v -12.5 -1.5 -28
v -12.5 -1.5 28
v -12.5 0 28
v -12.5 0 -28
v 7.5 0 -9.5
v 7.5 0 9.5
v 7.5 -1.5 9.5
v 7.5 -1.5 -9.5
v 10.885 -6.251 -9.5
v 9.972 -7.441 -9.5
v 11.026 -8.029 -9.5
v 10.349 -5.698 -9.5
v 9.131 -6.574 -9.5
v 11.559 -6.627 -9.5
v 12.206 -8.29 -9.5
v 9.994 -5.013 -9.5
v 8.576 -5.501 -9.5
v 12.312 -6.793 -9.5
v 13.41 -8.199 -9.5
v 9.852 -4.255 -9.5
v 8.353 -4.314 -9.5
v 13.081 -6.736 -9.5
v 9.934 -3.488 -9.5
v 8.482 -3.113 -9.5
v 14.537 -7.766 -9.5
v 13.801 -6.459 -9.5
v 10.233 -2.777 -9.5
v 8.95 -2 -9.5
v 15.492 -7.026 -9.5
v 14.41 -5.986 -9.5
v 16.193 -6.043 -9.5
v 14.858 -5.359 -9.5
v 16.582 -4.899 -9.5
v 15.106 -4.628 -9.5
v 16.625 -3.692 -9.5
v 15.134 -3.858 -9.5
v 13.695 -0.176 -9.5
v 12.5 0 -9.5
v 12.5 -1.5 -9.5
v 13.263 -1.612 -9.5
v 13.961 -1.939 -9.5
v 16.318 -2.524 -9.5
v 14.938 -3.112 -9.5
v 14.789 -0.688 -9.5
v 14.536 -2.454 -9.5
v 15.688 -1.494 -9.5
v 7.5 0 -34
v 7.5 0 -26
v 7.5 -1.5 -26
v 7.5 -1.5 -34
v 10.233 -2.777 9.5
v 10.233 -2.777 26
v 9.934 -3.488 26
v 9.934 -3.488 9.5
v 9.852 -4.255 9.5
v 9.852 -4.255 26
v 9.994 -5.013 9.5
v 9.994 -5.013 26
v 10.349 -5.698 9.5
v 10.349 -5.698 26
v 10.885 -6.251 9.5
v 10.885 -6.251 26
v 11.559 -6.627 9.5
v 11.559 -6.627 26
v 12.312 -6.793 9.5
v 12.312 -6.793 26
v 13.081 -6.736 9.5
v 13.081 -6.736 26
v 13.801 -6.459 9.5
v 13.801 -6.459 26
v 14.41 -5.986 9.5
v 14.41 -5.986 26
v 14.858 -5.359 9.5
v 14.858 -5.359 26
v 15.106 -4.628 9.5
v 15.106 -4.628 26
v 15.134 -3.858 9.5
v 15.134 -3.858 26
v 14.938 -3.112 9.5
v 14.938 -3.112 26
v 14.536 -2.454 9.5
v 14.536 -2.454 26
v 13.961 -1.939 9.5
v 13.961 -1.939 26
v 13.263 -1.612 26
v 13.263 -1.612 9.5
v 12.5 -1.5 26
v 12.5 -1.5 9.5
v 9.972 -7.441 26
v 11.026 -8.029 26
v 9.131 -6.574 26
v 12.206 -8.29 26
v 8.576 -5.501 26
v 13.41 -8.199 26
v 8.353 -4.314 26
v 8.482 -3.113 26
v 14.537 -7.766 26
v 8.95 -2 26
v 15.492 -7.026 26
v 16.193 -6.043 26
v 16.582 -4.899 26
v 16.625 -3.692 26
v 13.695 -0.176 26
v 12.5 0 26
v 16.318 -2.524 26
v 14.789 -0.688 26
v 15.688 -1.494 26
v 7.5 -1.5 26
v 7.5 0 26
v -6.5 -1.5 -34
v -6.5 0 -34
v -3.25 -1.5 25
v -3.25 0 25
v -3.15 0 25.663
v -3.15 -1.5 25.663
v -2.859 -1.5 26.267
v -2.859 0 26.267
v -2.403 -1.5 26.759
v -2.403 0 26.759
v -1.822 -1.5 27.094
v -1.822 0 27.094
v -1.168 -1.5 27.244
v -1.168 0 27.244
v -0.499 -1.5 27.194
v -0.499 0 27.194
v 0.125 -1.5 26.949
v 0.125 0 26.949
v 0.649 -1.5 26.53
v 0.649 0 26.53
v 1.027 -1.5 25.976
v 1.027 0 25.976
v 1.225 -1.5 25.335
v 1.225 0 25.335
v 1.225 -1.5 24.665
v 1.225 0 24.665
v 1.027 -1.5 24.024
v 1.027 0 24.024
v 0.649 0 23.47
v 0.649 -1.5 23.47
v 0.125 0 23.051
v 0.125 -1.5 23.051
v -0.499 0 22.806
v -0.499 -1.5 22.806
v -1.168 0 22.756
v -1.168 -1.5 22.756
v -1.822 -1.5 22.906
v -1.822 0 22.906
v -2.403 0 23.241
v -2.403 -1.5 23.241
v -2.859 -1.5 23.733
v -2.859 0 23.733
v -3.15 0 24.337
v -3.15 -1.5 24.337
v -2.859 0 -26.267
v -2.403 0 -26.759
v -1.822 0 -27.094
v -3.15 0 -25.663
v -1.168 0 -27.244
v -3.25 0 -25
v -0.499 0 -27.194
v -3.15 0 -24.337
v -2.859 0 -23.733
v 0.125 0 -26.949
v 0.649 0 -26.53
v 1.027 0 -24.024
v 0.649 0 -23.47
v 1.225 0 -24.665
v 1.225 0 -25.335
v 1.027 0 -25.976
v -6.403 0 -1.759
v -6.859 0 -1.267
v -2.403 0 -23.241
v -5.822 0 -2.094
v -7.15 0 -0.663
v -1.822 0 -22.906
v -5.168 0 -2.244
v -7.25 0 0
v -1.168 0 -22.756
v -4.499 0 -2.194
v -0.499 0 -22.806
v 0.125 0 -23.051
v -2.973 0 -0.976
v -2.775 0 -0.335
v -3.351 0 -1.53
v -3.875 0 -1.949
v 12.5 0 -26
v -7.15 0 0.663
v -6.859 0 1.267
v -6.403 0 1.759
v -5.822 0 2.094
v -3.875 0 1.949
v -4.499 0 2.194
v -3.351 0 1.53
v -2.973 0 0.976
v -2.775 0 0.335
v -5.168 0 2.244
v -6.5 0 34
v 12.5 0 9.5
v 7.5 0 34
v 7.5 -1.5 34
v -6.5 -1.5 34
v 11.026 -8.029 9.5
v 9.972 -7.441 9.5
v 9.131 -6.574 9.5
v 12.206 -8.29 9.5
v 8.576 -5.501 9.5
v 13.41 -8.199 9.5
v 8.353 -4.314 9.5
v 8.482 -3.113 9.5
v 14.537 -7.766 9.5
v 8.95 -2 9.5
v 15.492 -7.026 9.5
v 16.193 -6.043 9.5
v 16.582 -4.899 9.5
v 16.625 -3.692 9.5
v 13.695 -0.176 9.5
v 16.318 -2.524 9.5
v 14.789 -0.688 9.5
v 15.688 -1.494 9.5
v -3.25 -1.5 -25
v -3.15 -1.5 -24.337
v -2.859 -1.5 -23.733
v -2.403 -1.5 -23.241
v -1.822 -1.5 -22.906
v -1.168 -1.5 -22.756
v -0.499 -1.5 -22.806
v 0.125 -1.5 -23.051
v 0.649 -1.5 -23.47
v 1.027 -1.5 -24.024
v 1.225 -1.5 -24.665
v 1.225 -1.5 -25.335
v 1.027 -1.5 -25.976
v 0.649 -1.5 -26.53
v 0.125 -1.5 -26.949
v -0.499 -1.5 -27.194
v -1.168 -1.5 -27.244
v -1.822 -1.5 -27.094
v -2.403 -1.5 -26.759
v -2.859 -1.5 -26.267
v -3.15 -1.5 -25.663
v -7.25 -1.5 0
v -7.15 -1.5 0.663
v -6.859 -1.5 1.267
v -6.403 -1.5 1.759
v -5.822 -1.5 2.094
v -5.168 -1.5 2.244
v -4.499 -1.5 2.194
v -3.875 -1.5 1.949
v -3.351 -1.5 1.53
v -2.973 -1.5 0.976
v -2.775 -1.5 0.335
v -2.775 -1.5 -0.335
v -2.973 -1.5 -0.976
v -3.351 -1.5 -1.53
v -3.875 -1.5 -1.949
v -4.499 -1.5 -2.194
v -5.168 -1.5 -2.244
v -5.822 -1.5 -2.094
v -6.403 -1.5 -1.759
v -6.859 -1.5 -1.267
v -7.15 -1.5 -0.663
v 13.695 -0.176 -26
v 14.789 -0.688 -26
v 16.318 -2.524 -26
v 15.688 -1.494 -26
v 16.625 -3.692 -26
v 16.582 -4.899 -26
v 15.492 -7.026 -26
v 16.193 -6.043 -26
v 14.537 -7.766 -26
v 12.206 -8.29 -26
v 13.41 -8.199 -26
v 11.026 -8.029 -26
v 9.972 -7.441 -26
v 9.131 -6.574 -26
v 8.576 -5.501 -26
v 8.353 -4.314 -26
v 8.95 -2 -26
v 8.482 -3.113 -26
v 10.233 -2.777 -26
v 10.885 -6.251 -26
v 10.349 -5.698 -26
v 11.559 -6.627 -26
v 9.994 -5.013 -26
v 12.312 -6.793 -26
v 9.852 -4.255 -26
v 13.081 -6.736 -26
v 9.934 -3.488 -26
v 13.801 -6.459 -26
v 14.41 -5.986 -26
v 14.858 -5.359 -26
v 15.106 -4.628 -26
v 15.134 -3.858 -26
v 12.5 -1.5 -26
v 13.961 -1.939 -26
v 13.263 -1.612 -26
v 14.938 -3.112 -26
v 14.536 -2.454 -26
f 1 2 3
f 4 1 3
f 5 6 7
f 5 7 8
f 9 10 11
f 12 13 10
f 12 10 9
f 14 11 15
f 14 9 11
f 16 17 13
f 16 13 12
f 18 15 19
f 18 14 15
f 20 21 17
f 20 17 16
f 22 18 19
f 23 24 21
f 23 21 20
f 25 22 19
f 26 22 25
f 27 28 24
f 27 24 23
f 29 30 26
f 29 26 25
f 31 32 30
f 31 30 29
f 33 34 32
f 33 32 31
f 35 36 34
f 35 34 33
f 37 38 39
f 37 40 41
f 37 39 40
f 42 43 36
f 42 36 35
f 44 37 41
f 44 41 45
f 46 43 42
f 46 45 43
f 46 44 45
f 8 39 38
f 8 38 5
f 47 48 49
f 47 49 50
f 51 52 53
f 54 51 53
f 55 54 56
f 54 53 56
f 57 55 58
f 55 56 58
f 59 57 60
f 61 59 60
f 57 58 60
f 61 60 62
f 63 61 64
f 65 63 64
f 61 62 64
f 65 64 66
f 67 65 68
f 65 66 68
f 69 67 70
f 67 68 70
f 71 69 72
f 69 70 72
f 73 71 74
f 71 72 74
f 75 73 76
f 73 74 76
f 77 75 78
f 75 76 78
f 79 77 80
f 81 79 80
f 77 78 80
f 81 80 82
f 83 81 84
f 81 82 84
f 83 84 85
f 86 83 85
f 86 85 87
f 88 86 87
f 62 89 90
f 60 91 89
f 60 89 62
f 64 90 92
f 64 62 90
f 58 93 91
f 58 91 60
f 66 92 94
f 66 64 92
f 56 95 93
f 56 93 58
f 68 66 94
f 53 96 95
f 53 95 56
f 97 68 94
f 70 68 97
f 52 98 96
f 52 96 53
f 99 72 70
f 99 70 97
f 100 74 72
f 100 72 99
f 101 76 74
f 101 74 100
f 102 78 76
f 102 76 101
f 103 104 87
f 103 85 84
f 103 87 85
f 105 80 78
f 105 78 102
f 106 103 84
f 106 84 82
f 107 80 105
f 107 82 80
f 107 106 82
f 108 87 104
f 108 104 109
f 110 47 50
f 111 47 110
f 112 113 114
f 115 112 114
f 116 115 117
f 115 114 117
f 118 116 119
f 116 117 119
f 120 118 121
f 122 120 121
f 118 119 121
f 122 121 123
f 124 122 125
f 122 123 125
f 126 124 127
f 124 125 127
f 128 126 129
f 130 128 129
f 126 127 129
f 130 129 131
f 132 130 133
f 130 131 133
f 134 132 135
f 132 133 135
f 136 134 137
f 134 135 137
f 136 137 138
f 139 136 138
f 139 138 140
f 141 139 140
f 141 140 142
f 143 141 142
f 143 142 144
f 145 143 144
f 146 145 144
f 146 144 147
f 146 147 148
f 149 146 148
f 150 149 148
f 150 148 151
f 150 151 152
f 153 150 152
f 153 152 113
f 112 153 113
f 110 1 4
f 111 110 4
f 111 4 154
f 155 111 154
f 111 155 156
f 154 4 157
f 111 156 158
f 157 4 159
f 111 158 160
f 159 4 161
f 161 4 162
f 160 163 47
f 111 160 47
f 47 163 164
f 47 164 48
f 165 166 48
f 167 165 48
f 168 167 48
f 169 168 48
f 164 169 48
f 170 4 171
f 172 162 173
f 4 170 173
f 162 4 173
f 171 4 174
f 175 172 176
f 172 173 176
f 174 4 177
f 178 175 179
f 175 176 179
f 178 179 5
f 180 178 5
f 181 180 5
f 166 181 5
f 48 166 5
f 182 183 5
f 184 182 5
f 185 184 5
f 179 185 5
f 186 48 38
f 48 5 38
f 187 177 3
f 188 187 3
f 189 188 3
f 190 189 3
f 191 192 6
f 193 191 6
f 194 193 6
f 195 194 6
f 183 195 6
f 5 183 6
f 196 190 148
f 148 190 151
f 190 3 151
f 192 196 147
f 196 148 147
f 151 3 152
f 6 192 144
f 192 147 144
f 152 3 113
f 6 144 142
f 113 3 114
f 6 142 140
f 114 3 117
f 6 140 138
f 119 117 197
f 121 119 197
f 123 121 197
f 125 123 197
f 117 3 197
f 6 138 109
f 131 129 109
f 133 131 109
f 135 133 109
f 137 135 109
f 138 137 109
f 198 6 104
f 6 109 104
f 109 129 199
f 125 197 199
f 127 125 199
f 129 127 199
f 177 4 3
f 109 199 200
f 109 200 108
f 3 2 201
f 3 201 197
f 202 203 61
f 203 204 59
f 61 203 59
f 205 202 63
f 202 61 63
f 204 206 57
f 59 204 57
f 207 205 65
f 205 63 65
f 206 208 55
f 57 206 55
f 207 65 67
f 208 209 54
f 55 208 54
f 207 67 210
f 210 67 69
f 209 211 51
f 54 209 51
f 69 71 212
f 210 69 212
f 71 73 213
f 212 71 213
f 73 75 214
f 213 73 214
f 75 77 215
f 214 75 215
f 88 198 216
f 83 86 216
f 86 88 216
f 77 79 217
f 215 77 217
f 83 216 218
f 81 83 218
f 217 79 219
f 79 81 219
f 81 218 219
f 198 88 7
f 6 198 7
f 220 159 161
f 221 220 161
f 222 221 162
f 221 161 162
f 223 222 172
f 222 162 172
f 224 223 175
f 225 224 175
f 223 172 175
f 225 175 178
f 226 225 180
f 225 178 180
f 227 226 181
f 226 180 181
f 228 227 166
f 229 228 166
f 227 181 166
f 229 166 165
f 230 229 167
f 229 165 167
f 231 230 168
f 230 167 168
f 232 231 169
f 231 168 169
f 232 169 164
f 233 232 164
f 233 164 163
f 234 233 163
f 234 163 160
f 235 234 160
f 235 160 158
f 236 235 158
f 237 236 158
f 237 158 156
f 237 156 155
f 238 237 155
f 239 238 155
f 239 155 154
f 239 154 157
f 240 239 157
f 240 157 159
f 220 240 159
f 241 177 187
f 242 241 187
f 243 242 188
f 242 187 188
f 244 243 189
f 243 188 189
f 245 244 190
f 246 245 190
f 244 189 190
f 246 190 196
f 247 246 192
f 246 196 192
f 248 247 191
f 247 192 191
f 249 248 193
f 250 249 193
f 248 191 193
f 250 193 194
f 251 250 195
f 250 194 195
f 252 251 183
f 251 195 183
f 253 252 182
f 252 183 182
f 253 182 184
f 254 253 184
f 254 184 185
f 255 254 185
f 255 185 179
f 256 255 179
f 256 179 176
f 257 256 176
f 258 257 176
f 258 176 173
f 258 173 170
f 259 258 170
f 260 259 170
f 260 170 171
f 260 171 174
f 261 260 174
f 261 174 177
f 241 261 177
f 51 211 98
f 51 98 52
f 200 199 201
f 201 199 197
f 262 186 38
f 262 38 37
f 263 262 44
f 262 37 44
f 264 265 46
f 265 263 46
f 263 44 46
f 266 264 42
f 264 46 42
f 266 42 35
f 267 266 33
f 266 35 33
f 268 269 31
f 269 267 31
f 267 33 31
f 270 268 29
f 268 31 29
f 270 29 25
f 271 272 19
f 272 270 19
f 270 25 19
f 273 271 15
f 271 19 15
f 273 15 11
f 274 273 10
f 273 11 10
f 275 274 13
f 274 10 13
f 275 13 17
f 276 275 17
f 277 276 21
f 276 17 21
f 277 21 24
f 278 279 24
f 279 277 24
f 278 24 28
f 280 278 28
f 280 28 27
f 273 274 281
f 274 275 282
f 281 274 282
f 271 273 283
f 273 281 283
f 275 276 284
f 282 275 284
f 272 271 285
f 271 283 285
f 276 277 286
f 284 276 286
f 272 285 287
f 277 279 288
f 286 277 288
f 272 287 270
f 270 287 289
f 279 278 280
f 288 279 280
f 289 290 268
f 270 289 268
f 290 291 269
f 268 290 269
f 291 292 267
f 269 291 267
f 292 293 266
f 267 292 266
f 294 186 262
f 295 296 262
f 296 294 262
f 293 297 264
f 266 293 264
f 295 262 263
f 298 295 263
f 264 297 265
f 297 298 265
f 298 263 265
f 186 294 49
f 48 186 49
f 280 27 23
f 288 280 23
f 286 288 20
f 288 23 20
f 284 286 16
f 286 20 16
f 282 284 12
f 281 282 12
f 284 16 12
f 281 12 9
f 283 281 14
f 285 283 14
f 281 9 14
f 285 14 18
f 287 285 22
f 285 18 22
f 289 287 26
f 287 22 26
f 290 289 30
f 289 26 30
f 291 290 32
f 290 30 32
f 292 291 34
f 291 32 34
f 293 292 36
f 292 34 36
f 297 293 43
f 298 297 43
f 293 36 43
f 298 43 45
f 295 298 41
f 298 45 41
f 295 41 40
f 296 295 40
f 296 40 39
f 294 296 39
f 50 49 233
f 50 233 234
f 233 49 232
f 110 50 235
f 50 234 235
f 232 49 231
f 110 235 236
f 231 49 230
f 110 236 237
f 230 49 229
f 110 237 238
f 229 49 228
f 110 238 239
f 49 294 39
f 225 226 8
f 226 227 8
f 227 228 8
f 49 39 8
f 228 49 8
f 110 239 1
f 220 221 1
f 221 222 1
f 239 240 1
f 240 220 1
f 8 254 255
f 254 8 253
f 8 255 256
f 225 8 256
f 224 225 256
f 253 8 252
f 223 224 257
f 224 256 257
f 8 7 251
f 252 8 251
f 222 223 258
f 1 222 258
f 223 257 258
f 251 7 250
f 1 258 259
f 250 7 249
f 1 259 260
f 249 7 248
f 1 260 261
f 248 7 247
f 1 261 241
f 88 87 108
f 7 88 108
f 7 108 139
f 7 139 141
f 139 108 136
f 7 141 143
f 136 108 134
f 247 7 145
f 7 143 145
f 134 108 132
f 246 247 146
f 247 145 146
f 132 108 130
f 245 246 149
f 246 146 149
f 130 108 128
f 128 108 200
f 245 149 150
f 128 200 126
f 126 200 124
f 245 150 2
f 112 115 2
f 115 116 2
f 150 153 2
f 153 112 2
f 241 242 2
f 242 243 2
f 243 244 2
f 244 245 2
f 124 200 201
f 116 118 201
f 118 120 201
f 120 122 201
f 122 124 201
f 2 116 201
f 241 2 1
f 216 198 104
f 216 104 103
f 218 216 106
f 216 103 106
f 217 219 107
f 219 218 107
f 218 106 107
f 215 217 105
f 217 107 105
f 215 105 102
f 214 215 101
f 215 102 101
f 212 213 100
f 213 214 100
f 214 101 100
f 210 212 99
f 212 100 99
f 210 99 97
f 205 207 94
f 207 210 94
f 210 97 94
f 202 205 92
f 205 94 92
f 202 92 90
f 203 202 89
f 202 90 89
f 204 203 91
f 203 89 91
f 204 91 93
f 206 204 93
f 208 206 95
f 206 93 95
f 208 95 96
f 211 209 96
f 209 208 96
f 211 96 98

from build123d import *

# Parameters (mm, degrees)
TABAN_FLAN_1_DEPTH    = 34
IZIM9_W               = 9.15
IZIM9_H               = 8
IZIM9_H_2             = 19
KES_EKSTR_ZYON1_DEPTH = 39.757096124
IZIM11_R              = 2.25
KES_EKSTR_ZYON2_DEPTH = 10
RADYUS1_SIZE          = 6


# Sheet-metal steps are written as plain solids
with BuildPart() as part:
    # Çizim1 → Taban-Flanş1 (new, symmetric)
    with BuildSketch(Plane.XY):
        with BuildLine():
            Line((-12.5, 0), (12.5, 0))
            ThreePointArc((12.5, 0), (14.537154879, -7.765591238), (8.95035213, -2))
            Line((8.95035213, -2), (10.233357384, -2.777108434))
            ThreePointArc((10.233357384, -2.777108434), (13.800833838, -6.458751031), (12.5, -1.5))
            Line((12.5, -1.5), (-12.5, -1.5))
            Line((-12.5, -1.5), (-12.5, 0))
        make_face()
    extrude(amount=TABAN_FLAN_1_DEPTH, both=True)

    # Çizim9 → Kes-Ekstrüzyon1 (cut, through all)
    with BuildSketch(Plane(origin=(0, 0, 0), x_dir=(1, 0, 0), z_dir=(0, 1, 0))):
        with Locations((12.075, 30)):
            Rectangle(IZIM9_W, IZIM9_H)
        with Locations((12.075, -30)):
            Rectangle(IZIM9_W, IZIM9_H)
        with Locations((12.075, 0)):
            Rectangle(IZIM9_W, IZIM9_H_2)
    extrude(amount=-KES_EKSTR_ZYON1_DEPTH, mode=Mode.SUBTRACT)

    # Çizim11 → Kes-Ekstrüzyon2 (cut)
    with BuildSketch(Plane(origin=(0, 0, 0), x_dir=(1, 0, 0), z_dir=(0, 1, 0))):
        with Locations(Location((-1, 25, 0), (0, 0, 180))):
            Circle(IZIM11_R)
        with Locations(Location((-1, -25, 0), (0, 0, 180))):
            Circle(IZIM11_R)
        with Locations(Location((-5, 0, 0), (0, 0, 180))):
            Circle(IZIM11_R)
    extrude(amount=-KES_EKSTR_ZYON2_DEPTH, mode=Mode.SUBTRACT)

    # Radyus1
    radyus1_edges = [part.edges().sort_by_distance(p)[0] for p in [
        (-12.5, -0.75, 34),
        (-12.5, -0.75, -34),
    ]]
    chamfer(radyus1_edges, length=RADYUS1_SIZE)


solid = part.part
